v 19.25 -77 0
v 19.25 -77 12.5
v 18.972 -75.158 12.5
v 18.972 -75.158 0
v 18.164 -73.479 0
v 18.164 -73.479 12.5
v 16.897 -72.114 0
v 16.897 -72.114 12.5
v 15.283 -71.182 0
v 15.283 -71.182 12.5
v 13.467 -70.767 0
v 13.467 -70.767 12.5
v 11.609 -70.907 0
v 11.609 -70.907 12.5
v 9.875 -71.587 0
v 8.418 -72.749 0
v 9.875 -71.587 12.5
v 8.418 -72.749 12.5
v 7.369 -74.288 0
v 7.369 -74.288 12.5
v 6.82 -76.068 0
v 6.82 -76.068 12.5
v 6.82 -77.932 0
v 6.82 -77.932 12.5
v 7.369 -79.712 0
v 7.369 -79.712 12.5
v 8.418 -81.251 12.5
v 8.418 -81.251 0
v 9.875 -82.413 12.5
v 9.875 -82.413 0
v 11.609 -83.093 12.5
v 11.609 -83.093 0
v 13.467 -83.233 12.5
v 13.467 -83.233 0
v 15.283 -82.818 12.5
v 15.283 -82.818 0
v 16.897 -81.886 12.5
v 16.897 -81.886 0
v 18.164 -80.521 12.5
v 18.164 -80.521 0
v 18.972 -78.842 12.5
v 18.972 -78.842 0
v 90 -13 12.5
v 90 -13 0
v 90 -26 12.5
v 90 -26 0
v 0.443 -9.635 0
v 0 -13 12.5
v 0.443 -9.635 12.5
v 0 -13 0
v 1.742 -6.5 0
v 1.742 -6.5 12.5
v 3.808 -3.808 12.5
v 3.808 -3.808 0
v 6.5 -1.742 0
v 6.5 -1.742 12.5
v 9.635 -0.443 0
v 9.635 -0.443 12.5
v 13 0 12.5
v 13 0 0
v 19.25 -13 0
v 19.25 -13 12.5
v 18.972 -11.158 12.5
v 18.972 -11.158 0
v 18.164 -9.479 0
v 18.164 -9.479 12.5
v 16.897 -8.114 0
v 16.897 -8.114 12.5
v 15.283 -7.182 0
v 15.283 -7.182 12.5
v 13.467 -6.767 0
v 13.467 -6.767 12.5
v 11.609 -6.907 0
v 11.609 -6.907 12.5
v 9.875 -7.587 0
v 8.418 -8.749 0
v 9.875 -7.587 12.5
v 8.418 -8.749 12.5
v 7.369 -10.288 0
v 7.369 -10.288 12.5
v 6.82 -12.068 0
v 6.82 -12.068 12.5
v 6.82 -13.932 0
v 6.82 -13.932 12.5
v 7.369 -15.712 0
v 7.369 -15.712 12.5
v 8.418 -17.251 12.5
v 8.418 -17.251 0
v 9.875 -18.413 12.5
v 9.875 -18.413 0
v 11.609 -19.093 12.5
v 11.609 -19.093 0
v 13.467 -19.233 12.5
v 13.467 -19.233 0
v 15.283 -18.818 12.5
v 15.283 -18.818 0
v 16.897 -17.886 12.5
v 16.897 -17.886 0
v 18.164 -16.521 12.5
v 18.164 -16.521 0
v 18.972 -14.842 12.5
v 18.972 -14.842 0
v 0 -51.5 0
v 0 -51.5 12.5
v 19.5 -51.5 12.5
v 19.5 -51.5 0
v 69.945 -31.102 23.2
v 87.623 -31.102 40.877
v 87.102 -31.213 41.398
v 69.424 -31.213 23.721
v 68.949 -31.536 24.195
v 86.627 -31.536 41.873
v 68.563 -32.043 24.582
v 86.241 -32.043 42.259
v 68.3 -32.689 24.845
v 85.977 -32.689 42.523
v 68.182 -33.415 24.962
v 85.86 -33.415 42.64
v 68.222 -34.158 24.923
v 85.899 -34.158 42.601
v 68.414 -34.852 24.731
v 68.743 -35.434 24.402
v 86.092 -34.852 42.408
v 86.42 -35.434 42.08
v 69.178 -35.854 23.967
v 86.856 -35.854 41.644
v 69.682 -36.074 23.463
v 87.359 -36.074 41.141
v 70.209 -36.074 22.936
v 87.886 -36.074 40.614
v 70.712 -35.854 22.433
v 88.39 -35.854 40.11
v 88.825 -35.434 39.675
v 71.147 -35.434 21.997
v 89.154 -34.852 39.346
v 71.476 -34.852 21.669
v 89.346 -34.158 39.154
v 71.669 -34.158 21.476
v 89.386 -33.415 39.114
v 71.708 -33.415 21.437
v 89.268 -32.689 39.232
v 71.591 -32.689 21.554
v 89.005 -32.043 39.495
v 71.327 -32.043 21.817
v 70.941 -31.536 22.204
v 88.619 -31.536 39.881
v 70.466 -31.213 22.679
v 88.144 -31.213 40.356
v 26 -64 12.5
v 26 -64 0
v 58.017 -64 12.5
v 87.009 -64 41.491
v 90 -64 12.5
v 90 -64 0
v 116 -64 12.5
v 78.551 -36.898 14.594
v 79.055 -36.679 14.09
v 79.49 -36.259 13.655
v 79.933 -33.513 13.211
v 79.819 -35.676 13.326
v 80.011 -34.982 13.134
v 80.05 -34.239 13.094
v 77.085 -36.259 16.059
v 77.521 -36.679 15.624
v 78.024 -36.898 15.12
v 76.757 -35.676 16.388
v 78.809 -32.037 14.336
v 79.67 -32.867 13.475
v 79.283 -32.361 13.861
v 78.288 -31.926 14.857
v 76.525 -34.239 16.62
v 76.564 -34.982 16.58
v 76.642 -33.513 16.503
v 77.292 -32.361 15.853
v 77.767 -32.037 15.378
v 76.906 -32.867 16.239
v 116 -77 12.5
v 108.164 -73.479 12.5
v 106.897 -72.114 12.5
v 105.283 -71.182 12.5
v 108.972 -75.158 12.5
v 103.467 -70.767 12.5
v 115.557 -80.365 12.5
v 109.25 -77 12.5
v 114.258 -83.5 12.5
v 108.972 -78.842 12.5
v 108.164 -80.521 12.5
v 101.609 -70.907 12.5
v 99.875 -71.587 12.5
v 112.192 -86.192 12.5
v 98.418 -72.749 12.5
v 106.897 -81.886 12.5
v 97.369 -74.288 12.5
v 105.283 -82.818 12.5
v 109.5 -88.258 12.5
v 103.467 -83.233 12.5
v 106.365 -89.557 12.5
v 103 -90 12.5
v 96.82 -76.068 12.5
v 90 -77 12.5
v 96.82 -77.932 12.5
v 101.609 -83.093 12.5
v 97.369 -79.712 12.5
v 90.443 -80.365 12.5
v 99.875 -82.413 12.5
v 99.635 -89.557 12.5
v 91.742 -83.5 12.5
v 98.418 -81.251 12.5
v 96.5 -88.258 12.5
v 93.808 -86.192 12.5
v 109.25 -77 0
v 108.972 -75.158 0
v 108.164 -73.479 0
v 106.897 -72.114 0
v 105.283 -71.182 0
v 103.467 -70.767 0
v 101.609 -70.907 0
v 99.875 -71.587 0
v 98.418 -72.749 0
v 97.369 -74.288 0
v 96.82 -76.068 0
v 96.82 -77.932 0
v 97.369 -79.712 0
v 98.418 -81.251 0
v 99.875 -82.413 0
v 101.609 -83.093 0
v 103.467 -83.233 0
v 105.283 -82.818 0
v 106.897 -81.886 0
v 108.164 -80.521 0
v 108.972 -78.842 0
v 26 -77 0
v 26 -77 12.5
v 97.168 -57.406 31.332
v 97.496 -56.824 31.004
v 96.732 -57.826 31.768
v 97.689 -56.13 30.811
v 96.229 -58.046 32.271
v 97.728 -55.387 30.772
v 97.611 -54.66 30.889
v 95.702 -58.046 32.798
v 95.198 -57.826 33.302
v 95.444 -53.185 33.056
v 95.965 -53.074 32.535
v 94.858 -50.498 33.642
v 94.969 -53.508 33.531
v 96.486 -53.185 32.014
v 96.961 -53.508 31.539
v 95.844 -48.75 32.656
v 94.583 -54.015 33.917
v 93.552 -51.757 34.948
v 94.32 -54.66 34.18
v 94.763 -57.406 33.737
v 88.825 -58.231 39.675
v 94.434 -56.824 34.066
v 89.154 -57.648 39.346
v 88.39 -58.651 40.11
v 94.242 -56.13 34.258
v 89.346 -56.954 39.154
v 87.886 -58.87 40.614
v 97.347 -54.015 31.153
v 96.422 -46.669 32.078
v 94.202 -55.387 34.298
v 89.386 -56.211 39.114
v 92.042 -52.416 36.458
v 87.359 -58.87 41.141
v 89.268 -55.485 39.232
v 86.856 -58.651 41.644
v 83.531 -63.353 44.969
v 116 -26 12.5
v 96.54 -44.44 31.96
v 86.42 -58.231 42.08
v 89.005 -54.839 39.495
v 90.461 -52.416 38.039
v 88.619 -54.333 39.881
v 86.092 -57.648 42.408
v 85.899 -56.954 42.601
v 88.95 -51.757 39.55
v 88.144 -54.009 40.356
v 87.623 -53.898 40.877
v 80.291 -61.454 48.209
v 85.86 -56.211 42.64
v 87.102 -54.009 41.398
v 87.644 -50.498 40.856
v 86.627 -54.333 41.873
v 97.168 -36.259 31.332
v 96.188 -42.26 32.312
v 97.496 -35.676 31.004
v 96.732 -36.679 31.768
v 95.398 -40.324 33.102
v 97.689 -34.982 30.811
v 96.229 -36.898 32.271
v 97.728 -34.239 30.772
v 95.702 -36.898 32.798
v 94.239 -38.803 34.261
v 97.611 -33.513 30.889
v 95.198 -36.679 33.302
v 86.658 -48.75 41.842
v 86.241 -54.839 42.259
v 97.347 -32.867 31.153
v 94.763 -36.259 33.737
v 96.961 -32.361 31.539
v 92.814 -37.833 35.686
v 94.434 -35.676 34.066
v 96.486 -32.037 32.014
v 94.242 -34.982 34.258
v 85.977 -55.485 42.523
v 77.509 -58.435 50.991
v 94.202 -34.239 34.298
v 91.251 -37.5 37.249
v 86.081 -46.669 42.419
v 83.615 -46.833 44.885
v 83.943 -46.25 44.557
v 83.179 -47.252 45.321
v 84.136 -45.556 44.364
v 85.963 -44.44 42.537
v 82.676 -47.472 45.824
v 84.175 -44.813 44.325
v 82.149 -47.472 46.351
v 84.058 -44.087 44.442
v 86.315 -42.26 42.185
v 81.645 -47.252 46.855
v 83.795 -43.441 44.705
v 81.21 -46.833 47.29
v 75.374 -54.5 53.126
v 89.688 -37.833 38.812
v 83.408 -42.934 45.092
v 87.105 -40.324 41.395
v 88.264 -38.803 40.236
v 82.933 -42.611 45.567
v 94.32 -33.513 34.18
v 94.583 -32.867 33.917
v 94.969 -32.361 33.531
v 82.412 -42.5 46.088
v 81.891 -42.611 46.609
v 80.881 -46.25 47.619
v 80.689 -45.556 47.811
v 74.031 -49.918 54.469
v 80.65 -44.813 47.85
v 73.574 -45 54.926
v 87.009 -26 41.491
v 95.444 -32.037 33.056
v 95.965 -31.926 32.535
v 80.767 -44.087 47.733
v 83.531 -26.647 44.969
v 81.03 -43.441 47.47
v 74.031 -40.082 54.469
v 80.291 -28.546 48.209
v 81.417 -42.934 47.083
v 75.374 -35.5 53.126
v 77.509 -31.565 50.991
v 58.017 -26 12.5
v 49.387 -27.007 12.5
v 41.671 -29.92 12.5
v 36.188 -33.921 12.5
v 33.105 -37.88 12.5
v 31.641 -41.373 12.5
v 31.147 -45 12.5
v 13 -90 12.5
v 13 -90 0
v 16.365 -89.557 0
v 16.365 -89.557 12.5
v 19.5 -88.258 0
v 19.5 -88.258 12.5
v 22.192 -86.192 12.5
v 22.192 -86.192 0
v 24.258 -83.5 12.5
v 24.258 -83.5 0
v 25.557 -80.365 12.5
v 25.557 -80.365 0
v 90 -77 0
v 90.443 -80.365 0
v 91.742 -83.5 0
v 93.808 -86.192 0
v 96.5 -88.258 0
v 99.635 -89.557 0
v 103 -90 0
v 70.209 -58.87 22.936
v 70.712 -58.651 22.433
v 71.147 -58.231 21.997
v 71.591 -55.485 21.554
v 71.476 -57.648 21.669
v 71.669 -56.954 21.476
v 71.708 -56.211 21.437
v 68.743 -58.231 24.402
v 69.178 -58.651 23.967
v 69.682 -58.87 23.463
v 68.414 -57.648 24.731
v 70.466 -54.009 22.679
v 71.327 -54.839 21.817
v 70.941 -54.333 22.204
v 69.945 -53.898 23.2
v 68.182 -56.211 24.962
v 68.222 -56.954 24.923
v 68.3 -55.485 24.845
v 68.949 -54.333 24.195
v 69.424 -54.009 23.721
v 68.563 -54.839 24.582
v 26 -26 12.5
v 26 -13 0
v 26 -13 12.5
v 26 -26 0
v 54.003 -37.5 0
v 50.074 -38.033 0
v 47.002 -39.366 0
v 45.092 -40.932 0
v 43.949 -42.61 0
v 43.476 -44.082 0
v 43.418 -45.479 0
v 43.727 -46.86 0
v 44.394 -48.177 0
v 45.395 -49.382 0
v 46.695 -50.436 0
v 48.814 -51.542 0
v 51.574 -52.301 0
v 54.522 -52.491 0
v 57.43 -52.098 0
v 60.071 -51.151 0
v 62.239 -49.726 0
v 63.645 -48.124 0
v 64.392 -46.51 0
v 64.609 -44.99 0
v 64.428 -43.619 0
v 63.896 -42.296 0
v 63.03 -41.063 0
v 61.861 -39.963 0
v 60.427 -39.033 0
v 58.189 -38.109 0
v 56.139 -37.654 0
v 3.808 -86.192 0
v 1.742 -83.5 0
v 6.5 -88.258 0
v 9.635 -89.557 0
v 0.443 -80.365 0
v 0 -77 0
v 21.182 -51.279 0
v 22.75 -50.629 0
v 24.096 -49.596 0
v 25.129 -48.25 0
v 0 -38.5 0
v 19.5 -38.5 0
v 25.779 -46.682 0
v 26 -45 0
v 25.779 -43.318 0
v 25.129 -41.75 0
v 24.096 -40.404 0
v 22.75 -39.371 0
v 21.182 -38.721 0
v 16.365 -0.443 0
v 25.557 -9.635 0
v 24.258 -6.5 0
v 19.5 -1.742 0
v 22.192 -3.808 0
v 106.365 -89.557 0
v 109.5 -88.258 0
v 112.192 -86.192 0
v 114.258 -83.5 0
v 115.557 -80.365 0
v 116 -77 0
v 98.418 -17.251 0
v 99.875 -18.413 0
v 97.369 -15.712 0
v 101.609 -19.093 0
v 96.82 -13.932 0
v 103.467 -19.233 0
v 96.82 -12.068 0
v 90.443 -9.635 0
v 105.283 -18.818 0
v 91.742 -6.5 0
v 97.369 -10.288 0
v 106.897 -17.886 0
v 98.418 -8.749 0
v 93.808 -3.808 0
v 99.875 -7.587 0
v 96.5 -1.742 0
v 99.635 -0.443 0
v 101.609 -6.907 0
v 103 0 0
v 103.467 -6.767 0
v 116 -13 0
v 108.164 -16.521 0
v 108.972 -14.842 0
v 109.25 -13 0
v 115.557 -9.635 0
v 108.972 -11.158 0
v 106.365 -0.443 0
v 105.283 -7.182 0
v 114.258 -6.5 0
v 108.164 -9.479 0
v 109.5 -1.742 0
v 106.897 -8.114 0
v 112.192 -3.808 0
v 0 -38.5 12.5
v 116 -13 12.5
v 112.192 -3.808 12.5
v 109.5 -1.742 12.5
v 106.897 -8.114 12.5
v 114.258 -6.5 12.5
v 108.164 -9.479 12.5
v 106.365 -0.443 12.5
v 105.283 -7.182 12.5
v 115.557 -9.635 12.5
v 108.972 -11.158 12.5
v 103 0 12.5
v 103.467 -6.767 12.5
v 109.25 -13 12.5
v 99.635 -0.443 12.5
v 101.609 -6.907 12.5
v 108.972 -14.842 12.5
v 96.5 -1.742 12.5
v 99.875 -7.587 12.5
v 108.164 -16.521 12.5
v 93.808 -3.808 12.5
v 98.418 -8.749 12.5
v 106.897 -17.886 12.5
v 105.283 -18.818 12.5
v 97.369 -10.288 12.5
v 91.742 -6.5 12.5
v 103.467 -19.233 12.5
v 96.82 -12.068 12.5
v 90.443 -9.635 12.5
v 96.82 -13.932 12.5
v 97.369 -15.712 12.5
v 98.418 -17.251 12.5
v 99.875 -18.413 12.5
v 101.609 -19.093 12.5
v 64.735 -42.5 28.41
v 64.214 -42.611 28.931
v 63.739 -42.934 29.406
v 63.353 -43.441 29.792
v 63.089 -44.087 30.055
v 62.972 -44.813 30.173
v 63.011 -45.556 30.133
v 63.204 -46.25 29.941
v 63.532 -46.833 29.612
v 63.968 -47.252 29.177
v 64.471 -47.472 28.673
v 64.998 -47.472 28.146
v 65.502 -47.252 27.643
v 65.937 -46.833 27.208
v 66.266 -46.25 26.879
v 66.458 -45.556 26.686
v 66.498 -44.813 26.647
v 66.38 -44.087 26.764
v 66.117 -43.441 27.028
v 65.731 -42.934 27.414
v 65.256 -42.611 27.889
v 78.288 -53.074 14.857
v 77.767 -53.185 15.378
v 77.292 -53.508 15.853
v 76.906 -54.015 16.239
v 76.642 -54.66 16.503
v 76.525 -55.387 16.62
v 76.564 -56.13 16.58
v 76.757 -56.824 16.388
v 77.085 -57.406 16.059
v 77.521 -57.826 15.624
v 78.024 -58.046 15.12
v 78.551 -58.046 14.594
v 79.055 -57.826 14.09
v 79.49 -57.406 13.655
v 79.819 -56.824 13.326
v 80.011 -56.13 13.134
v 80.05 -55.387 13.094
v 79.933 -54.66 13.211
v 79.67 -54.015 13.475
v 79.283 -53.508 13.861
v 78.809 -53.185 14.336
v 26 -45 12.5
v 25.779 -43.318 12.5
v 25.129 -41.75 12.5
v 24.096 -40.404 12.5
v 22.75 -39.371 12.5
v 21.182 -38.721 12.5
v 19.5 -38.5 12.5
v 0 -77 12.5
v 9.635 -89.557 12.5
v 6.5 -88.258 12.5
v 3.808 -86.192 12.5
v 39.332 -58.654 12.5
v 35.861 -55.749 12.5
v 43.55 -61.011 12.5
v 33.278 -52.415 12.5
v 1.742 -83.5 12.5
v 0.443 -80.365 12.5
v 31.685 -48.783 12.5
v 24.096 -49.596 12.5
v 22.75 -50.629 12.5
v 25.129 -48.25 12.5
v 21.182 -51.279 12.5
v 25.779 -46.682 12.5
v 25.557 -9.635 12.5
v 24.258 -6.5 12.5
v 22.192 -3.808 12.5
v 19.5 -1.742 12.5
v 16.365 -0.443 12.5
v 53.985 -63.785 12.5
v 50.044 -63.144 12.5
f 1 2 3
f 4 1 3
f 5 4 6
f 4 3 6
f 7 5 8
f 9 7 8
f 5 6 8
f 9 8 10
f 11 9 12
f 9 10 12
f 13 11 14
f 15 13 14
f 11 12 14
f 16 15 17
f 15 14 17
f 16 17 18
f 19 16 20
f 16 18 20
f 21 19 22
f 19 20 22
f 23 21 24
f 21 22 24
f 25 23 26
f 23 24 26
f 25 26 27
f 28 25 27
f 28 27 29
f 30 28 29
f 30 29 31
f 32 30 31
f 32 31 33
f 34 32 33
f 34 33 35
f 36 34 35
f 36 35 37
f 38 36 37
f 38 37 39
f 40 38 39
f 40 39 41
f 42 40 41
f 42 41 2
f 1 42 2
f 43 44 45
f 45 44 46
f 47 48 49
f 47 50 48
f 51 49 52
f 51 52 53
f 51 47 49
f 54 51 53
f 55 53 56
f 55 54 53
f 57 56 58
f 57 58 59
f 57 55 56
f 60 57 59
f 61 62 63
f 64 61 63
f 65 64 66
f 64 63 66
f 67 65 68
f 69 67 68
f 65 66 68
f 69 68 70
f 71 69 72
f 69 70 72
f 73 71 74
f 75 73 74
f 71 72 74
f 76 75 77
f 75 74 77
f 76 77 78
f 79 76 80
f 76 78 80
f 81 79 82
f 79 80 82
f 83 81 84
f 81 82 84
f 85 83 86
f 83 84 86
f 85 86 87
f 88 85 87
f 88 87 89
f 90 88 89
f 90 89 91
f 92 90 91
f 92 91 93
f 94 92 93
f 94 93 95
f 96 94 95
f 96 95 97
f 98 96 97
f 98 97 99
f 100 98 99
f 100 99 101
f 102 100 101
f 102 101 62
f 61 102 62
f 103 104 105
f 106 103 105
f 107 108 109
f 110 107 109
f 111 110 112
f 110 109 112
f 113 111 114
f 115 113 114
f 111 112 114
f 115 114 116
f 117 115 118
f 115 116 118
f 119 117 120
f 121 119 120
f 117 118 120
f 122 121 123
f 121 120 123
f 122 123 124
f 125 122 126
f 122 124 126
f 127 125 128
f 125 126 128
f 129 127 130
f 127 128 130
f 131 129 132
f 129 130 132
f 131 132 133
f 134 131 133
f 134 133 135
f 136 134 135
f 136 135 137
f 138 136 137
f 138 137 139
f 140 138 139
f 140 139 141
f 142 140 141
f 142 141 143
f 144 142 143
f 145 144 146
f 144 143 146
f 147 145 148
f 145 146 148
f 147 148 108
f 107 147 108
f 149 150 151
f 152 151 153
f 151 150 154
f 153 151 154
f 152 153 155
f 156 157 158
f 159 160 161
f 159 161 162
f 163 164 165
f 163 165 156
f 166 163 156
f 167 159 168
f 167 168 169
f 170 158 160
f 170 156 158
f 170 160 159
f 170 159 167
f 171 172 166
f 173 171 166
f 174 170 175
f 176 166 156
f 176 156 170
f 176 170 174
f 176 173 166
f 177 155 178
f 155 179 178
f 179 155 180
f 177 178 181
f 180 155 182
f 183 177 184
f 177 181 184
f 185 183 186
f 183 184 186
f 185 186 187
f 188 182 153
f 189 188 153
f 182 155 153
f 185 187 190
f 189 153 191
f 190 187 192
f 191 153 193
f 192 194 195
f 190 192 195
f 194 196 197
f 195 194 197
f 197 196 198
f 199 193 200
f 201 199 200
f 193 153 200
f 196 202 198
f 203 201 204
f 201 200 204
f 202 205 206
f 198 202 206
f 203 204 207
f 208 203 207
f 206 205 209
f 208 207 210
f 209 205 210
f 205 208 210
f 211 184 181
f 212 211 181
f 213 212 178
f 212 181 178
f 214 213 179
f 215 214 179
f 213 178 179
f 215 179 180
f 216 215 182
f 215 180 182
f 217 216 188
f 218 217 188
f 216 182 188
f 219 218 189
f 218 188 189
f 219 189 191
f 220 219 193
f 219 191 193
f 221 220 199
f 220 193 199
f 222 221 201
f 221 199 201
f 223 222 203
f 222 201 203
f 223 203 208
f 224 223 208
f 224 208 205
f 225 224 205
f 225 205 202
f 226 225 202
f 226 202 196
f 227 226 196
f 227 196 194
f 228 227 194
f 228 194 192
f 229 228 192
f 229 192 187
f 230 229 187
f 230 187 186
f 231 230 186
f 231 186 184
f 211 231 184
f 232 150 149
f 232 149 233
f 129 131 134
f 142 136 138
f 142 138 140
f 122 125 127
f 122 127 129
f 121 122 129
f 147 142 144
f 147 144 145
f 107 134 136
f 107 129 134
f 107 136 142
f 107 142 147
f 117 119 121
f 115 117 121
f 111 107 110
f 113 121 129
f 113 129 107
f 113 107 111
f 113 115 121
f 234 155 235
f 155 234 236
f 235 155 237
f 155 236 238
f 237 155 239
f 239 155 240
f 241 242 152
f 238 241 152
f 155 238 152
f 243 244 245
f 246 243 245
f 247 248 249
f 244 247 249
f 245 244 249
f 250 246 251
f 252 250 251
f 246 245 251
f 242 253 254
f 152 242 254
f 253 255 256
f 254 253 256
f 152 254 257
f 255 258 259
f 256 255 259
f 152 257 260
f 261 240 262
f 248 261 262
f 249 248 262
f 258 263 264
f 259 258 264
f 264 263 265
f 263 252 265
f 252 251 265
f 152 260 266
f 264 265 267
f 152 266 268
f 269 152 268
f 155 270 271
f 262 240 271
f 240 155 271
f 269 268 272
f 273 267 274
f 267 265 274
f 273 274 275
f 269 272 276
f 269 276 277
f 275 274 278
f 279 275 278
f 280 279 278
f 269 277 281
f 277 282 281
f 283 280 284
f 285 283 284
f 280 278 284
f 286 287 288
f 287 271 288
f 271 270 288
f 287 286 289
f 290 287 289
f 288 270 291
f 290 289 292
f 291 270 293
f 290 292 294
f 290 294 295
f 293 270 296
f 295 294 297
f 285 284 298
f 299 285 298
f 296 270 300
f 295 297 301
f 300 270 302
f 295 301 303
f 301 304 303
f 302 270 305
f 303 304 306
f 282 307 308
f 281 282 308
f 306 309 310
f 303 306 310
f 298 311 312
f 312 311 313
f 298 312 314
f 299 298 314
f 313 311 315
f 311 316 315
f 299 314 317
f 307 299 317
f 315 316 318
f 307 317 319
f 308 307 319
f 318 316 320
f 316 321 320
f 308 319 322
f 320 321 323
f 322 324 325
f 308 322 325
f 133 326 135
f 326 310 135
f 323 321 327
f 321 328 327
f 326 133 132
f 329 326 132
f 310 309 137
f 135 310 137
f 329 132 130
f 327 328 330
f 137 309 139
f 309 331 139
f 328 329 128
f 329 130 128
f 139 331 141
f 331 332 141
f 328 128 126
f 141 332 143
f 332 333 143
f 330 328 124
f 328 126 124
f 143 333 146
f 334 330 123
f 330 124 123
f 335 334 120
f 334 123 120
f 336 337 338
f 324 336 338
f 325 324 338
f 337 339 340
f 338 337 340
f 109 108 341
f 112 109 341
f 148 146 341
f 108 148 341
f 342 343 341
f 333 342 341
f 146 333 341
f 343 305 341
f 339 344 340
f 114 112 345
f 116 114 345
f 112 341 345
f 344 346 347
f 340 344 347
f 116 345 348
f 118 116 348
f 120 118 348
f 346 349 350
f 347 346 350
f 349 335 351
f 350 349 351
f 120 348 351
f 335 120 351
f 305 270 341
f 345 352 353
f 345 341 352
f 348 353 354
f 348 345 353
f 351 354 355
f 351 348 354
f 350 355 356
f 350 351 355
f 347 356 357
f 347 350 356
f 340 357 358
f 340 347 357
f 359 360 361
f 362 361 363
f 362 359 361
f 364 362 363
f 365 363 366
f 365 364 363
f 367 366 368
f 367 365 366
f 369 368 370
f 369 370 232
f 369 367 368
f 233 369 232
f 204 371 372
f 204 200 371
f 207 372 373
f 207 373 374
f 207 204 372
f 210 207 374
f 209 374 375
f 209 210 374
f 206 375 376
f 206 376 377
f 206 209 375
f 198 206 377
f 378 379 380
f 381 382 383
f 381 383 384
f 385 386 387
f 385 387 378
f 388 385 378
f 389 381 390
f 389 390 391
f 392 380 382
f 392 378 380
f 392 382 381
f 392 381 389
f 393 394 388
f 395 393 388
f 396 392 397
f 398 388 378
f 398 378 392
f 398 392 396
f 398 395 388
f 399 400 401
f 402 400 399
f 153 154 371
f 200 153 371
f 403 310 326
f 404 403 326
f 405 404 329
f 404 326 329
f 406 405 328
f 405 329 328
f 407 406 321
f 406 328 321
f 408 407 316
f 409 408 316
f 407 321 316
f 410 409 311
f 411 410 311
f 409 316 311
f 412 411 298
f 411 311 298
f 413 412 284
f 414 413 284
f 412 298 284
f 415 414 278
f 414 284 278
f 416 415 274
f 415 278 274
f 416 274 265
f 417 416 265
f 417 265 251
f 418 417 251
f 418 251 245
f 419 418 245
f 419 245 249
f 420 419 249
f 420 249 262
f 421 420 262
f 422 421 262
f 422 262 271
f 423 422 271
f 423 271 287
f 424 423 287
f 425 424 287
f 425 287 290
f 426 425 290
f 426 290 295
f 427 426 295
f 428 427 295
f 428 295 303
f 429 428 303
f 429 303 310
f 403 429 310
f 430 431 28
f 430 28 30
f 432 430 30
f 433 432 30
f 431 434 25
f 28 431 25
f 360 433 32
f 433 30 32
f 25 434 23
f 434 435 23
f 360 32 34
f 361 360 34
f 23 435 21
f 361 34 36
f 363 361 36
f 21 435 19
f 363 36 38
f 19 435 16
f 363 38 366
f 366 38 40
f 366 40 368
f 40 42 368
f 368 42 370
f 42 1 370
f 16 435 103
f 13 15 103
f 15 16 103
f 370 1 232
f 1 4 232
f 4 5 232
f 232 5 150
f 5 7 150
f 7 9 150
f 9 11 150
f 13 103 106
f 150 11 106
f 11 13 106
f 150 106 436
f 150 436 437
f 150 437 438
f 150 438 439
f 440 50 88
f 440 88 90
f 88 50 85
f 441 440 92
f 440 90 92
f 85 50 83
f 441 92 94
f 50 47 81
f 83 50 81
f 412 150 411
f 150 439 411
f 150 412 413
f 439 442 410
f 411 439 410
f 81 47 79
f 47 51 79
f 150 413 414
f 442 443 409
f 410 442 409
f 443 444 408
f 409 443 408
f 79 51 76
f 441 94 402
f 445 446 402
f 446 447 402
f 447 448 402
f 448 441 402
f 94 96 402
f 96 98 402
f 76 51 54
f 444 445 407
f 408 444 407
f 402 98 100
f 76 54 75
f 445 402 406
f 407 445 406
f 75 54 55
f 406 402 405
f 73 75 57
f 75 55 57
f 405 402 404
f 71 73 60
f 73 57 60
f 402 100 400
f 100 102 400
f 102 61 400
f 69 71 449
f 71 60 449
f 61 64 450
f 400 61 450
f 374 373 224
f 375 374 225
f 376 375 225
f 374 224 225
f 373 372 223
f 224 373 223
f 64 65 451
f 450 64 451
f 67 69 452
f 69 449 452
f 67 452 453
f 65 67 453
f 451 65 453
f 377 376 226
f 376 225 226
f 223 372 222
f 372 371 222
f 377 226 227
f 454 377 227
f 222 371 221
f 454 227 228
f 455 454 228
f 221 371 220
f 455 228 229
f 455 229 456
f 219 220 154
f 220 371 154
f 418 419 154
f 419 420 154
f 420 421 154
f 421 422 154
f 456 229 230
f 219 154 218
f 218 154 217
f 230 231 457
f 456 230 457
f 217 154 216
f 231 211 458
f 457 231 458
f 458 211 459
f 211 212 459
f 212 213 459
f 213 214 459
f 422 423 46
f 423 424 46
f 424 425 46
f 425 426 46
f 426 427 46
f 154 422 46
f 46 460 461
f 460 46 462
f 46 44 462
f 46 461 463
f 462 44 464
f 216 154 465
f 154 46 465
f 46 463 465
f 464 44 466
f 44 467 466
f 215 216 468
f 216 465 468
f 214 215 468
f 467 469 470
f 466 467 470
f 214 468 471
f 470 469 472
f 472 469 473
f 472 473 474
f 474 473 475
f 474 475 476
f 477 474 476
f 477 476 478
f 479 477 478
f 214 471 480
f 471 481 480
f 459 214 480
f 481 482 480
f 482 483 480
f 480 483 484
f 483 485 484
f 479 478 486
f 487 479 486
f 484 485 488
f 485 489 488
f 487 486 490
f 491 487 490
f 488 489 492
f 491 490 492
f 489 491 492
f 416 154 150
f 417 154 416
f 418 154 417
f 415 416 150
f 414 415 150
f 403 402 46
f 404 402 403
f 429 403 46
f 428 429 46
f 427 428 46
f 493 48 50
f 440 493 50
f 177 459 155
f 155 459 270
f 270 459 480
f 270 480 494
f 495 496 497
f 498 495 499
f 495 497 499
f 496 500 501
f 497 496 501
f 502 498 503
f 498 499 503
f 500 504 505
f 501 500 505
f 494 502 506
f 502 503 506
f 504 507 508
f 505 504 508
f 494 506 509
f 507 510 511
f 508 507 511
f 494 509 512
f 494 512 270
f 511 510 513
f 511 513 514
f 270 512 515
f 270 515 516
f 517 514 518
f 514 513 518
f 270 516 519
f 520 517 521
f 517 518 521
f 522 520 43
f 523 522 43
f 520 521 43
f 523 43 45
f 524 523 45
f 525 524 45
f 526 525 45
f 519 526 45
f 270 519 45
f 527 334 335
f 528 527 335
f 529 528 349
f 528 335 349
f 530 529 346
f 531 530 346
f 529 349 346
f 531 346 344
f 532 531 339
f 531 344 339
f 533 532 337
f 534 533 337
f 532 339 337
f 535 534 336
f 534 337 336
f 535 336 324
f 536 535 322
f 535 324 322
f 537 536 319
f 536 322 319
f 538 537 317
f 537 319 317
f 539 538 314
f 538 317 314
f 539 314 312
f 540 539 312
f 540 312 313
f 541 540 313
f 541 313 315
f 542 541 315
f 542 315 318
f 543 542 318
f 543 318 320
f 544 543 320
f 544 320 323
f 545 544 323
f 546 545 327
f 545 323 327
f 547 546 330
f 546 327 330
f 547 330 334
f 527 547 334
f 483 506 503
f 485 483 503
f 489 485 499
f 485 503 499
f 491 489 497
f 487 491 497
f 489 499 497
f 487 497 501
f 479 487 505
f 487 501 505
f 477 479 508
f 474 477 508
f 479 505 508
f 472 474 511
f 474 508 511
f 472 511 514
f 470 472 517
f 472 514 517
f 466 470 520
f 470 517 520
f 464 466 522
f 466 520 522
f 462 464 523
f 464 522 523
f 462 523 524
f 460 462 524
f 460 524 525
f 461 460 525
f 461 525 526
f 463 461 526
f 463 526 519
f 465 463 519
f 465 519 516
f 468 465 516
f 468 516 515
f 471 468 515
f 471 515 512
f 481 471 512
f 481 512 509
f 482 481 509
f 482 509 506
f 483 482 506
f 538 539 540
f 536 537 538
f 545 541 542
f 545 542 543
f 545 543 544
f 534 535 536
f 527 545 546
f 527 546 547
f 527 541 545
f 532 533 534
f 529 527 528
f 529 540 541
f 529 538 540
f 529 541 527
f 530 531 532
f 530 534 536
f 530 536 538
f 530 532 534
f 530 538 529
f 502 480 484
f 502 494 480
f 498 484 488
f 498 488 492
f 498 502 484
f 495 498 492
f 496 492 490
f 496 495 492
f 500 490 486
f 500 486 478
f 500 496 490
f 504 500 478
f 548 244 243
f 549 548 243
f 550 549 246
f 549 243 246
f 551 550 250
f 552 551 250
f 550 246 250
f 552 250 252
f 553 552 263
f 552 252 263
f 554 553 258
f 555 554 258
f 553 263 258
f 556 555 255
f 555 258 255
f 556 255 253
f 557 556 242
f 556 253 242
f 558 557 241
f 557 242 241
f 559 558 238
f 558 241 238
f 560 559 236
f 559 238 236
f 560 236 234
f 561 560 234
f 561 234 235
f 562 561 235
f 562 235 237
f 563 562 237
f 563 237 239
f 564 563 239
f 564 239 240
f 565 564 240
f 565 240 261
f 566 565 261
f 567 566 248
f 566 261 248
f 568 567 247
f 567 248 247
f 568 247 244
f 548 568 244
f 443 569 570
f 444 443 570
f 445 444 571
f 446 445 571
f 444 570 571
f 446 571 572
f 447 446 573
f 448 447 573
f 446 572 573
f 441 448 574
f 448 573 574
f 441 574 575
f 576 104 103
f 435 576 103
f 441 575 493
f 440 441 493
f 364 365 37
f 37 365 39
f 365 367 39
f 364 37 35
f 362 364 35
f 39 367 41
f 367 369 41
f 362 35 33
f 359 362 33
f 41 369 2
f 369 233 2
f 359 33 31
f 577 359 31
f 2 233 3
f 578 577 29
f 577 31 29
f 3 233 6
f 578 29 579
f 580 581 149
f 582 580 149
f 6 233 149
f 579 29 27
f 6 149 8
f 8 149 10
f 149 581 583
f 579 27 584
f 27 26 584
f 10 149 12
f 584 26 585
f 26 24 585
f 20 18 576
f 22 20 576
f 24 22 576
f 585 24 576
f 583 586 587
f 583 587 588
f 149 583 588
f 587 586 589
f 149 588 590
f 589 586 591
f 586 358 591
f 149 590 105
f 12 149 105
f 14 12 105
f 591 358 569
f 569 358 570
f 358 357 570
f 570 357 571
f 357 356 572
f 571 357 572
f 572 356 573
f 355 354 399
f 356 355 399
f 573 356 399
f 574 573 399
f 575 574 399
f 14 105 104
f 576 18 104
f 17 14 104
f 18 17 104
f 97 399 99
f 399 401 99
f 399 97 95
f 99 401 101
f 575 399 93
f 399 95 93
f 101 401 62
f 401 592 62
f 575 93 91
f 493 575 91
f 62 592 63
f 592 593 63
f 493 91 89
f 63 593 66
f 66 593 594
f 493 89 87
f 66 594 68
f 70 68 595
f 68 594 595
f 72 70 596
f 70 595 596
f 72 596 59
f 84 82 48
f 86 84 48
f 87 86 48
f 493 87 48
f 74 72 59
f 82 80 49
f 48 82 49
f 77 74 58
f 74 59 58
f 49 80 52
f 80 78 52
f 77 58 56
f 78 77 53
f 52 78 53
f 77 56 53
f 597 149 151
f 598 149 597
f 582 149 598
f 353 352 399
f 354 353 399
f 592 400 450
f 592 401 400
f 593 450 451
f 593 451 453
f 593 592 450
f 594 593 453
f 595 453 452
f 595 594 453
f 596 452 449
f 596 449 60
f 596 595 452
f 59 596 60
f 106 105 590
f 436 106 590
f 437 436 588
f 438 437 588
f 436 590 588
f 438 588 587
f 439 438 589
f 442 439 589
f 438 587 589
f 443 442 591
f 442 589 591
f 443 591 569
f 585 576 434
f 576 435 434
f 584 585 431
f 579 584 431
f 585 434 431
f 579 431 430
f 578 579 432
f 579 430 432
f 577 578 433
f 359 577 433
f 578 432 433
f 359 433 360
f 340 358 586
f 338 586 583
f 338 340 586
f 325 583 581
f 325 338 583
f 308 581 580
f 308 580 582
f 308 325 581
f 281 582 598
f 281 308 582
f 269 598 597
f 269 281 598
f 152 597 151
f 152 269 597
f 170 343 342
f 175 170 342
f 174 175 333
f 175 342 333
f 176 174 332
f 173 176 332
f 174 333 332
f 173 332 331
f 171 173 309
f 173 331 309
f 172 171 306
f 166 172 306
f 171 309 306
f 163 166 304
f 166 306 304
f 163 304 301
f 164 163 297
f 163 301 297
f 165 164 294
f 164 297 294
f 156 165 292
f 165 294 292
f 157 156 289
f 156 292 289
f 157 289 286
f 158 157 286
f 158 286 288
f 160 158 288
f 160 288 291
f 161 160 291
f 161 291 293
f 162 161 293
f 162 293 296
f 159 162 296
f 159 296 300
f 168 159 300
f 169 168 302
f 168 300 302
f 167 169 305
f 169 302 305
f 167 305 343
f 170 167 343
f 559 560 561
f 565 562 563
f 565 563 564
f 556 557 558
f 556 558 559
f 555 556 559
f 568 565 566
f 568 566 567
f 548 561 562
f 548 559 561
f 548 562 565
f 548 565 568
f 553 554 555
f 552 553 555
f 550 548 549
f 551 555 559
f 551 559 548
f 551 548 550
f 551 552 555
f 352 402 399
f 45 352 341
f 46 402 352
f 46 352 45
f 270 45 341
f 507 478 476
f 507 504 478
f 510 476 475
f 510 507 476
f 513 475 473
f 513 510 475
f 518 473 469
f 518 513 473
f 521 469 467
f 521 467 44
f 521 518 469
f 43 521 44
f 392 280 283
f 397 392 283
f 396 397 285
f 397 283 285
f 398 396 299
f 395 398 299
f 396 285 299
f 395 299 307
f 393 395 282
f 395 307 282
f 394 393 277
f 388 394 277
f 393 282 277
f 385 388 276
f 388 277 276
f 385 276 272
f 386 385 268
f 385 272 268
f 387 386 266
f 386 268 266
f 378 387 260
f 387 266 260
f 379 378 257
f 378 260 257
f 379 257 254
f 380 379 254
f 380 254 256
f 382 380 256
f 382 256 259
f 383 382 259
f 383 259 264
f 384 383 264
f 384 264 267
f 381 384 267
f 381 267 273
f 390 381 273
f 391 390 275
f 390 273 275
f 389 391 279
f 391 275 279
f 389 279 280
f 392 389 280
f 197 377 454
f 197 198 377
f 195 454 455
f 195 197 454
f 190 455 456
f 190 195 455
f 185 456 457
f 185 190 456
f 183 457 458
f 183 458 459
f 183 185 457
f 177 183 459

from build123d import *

# Parameters (mm, degrees)
F1_DEPTH  = 90
F2_W      = 64
F2_H      = 26
F3_DEPTH  = 100
F4_W      = 26
F4_H      = 26
F5_DEPTH  = 100
F6_W      = 26
F6_H      = 26
F7_DEPTH  = 105
F8_R      = 12.99999
F9_R      = 18.99999
F10_R     = 7.5
F10_R_2   = 2.5
F11_DEPTH = 25
F13_DEPTH = 25
F15_DEPTH = 25
F17_DEPTH = 25
F19_DEPTH = 25
F20_R     = 7.5
F21_DEPTH = 100


# Not quite as in the source:
# - a fillet or chamfer is up to 0.001 mm smaller than in the source, because OpenCascade refuses the exact size


with BuildPart() as f1:
    # F0 (on Front) → F1 (new body)
    with BuildSketch(Plane.XZ):
        Polygon((0, 12.5), (0, 0), (116, 0), (116, 12.5), (73.5735931288, 54.9264068712), (31.1471862576, 12.5), align=None)
    extrude(amount=F1_DEPTH)

    # F2 (on face) → F3 (cut)
    with BuildSketch(Plane(origin=(0, 0, 0), x_dir=(1, 0, 0), z_dir=(0, 0, -1))):
        with Locations((58, 77)):
            Rectangle(F2_W, F2_H)
        with Locations((58, 13)):
            Rectangle(F2_W, F2_H)
    extrude(amount=-F3_DEPTH, mode=Mode.SUBTRACT)

    # F4 (on face) → F5 (cut)
    with BuildSketch(Plane(origin=(90, 0, 0), x_dir=(0, -1, 0), z_dir=(-1, 0, 0))):
        with Locations((13, 25.5)):
            Rectangle(F4_W, F4_H)
    extrude(amount=-F5_DEPTH, mode=Mode.SUBTRACT)

    # F6 (on face) → F7 (cut)
    with BuildSketch(Plane(origin=(90, 0, 0), x_dir=(0, -1, 0), z_dir=(-1, 0, 0))):
        with Locations((77, 25.5)):
            Rectangle(F6_W, F6_H)
    extrude(amount=-F7_DEPTH, mode=Mode.SUBTRACT)

    # F8 (radius 13 in the source; OpenCascade refuses exactly that, so slightly less here)
    f8_edges = [f1.edges().sort_by_distance(p)[0] for p in [
        (0, 0, 6.25),
        (26, 0, 6.25),
        (116, -90, 6.25),
        (90, -90, 6.25),
        (26, -90, 6.25),
        (0, -90, 6.25),
        (116, 0, 6.25),
        (90, 0, 6.25),
    ]]
    fillet(f8_edges, radius=F8_R)

    # F9 (radius 19 in the source; OpenCascade refuses exactly that, so slightly less here)
    f9_edges = [f1.edges().sort_by_distance(p)[0] for p in [
        (52.36039, -64, 33.713203),
        (52.36039, -26, 33.713203),
    ]]
    fillet(f9_edges, radius=F9_R)

    # F10 (on face) → F11 (cut)
    with BuildSketch(Plane(origin=(64.25, 0, 64.25), x_dir=(0, 1, 0), z_dir=(0.7071067812, 0, 0.7071067812))):
        with Locations((-45, -38.1855518528)):
            Circle(F10_R)
        with Locations((-45, -25.6855518528)):
            Circle(F10_R_2)
        with Locations((-33.6018534744, -33.0540554063)):
            Circle(F10_R_2)
        with Locations((-56.3981465256, -33.0540554063)):
            Circle(F10_R_2)
        with Locations((-55.573814617, -44.8522185195)):
            Circle(F10_R_2)
        with Locations((-34.426185383, -44.8522185195)):
            Circle(F10_R_2)
    extrude(amount=-F11_DEPTH, mode=Mode.SUBTRACT)

    # F12 (on face) → F13 (cut)
    with BuildSketch(Plane.XY.offset(12.5)):
        with BuildLine():
            ThreePointArc((6.75, -13), (13, -19.25), (19.25, -13))
            ThreePointArc((19.25, -13), (13, -6.75), (6.75, -13))
        make_face()
        with BuildLine():
            ThreePointArc((6.75, -77), (13, -83.25), (19.25, -77))
            ThreePointArc((19.25, -77), (13, -70.75), (6.75, -77))
        make_face()
    extrude(amount=-F13_DEPTH, mode=Mode.SUBTRACT)

    # F14 (on face) → F15 (cut)
    with BuildSketch(Plane.XY.offset(12.5)):
        with BuildLine():
            ThreePointArc((96.75, -13), (103, -19.25), (109.25, -13))
            ThreePointArc((109.25, -13), (103, -6.75), (96.75, -13))
        make_face()
    extrude(amount=-F15_DEPTH, mode=Mode.SUBTRACT)

    # F16 (on face) → F17 (cut)
    with BuildSketch(Plane.XY.offset(12.5)):
        with BuildLine():
            ThreePointArc((96.75, -77), (103, -83.25), (109.25, -77))
            ThreePointArc((109.25, -77), (103, -70.75), (96.75, -77))
        make_face()
    extrude(amount=-F17_DEPTH, mode=Mode.SUBTRACT)

    # F18 (on face) → F19 (cut)
    with BuildSketch(Plane.XY.offset(12.5)):
        with BuildLine():
            Line((19.5, -38.5), (0, -38.5))
            Line((0, -38.5), (0, -45))
            Line((0, -45), (0, -51.5))
            Line((0, -51.5), (19.5, -51.5))
            ThreePointArc((19.5, -51.5), (24.0961940777, -49.5961940777), (26, -45))
            ThreePointArc((26, -45), (24.0961940777, -40.4038059223), (19.5, -38.5))
        make_face()
    extrude(amount=-F19_DEPTH, mode=Mode.SUBTRACT)

    # F20 (on face) → F21 (cut)
    with BuildSketch(Plane(origin=(64.25, 0, 64.25), x_dir=(0, 1, 0), z_dir=(0.7071067812, 0, 0.7071067812))):
        with Locations((-45, -38.1855518528)):
            Circle(F20_R)
    extrude(amount=-F21_DEPTH, mode=Mode.SUBTRACT)


solid = f1.part
